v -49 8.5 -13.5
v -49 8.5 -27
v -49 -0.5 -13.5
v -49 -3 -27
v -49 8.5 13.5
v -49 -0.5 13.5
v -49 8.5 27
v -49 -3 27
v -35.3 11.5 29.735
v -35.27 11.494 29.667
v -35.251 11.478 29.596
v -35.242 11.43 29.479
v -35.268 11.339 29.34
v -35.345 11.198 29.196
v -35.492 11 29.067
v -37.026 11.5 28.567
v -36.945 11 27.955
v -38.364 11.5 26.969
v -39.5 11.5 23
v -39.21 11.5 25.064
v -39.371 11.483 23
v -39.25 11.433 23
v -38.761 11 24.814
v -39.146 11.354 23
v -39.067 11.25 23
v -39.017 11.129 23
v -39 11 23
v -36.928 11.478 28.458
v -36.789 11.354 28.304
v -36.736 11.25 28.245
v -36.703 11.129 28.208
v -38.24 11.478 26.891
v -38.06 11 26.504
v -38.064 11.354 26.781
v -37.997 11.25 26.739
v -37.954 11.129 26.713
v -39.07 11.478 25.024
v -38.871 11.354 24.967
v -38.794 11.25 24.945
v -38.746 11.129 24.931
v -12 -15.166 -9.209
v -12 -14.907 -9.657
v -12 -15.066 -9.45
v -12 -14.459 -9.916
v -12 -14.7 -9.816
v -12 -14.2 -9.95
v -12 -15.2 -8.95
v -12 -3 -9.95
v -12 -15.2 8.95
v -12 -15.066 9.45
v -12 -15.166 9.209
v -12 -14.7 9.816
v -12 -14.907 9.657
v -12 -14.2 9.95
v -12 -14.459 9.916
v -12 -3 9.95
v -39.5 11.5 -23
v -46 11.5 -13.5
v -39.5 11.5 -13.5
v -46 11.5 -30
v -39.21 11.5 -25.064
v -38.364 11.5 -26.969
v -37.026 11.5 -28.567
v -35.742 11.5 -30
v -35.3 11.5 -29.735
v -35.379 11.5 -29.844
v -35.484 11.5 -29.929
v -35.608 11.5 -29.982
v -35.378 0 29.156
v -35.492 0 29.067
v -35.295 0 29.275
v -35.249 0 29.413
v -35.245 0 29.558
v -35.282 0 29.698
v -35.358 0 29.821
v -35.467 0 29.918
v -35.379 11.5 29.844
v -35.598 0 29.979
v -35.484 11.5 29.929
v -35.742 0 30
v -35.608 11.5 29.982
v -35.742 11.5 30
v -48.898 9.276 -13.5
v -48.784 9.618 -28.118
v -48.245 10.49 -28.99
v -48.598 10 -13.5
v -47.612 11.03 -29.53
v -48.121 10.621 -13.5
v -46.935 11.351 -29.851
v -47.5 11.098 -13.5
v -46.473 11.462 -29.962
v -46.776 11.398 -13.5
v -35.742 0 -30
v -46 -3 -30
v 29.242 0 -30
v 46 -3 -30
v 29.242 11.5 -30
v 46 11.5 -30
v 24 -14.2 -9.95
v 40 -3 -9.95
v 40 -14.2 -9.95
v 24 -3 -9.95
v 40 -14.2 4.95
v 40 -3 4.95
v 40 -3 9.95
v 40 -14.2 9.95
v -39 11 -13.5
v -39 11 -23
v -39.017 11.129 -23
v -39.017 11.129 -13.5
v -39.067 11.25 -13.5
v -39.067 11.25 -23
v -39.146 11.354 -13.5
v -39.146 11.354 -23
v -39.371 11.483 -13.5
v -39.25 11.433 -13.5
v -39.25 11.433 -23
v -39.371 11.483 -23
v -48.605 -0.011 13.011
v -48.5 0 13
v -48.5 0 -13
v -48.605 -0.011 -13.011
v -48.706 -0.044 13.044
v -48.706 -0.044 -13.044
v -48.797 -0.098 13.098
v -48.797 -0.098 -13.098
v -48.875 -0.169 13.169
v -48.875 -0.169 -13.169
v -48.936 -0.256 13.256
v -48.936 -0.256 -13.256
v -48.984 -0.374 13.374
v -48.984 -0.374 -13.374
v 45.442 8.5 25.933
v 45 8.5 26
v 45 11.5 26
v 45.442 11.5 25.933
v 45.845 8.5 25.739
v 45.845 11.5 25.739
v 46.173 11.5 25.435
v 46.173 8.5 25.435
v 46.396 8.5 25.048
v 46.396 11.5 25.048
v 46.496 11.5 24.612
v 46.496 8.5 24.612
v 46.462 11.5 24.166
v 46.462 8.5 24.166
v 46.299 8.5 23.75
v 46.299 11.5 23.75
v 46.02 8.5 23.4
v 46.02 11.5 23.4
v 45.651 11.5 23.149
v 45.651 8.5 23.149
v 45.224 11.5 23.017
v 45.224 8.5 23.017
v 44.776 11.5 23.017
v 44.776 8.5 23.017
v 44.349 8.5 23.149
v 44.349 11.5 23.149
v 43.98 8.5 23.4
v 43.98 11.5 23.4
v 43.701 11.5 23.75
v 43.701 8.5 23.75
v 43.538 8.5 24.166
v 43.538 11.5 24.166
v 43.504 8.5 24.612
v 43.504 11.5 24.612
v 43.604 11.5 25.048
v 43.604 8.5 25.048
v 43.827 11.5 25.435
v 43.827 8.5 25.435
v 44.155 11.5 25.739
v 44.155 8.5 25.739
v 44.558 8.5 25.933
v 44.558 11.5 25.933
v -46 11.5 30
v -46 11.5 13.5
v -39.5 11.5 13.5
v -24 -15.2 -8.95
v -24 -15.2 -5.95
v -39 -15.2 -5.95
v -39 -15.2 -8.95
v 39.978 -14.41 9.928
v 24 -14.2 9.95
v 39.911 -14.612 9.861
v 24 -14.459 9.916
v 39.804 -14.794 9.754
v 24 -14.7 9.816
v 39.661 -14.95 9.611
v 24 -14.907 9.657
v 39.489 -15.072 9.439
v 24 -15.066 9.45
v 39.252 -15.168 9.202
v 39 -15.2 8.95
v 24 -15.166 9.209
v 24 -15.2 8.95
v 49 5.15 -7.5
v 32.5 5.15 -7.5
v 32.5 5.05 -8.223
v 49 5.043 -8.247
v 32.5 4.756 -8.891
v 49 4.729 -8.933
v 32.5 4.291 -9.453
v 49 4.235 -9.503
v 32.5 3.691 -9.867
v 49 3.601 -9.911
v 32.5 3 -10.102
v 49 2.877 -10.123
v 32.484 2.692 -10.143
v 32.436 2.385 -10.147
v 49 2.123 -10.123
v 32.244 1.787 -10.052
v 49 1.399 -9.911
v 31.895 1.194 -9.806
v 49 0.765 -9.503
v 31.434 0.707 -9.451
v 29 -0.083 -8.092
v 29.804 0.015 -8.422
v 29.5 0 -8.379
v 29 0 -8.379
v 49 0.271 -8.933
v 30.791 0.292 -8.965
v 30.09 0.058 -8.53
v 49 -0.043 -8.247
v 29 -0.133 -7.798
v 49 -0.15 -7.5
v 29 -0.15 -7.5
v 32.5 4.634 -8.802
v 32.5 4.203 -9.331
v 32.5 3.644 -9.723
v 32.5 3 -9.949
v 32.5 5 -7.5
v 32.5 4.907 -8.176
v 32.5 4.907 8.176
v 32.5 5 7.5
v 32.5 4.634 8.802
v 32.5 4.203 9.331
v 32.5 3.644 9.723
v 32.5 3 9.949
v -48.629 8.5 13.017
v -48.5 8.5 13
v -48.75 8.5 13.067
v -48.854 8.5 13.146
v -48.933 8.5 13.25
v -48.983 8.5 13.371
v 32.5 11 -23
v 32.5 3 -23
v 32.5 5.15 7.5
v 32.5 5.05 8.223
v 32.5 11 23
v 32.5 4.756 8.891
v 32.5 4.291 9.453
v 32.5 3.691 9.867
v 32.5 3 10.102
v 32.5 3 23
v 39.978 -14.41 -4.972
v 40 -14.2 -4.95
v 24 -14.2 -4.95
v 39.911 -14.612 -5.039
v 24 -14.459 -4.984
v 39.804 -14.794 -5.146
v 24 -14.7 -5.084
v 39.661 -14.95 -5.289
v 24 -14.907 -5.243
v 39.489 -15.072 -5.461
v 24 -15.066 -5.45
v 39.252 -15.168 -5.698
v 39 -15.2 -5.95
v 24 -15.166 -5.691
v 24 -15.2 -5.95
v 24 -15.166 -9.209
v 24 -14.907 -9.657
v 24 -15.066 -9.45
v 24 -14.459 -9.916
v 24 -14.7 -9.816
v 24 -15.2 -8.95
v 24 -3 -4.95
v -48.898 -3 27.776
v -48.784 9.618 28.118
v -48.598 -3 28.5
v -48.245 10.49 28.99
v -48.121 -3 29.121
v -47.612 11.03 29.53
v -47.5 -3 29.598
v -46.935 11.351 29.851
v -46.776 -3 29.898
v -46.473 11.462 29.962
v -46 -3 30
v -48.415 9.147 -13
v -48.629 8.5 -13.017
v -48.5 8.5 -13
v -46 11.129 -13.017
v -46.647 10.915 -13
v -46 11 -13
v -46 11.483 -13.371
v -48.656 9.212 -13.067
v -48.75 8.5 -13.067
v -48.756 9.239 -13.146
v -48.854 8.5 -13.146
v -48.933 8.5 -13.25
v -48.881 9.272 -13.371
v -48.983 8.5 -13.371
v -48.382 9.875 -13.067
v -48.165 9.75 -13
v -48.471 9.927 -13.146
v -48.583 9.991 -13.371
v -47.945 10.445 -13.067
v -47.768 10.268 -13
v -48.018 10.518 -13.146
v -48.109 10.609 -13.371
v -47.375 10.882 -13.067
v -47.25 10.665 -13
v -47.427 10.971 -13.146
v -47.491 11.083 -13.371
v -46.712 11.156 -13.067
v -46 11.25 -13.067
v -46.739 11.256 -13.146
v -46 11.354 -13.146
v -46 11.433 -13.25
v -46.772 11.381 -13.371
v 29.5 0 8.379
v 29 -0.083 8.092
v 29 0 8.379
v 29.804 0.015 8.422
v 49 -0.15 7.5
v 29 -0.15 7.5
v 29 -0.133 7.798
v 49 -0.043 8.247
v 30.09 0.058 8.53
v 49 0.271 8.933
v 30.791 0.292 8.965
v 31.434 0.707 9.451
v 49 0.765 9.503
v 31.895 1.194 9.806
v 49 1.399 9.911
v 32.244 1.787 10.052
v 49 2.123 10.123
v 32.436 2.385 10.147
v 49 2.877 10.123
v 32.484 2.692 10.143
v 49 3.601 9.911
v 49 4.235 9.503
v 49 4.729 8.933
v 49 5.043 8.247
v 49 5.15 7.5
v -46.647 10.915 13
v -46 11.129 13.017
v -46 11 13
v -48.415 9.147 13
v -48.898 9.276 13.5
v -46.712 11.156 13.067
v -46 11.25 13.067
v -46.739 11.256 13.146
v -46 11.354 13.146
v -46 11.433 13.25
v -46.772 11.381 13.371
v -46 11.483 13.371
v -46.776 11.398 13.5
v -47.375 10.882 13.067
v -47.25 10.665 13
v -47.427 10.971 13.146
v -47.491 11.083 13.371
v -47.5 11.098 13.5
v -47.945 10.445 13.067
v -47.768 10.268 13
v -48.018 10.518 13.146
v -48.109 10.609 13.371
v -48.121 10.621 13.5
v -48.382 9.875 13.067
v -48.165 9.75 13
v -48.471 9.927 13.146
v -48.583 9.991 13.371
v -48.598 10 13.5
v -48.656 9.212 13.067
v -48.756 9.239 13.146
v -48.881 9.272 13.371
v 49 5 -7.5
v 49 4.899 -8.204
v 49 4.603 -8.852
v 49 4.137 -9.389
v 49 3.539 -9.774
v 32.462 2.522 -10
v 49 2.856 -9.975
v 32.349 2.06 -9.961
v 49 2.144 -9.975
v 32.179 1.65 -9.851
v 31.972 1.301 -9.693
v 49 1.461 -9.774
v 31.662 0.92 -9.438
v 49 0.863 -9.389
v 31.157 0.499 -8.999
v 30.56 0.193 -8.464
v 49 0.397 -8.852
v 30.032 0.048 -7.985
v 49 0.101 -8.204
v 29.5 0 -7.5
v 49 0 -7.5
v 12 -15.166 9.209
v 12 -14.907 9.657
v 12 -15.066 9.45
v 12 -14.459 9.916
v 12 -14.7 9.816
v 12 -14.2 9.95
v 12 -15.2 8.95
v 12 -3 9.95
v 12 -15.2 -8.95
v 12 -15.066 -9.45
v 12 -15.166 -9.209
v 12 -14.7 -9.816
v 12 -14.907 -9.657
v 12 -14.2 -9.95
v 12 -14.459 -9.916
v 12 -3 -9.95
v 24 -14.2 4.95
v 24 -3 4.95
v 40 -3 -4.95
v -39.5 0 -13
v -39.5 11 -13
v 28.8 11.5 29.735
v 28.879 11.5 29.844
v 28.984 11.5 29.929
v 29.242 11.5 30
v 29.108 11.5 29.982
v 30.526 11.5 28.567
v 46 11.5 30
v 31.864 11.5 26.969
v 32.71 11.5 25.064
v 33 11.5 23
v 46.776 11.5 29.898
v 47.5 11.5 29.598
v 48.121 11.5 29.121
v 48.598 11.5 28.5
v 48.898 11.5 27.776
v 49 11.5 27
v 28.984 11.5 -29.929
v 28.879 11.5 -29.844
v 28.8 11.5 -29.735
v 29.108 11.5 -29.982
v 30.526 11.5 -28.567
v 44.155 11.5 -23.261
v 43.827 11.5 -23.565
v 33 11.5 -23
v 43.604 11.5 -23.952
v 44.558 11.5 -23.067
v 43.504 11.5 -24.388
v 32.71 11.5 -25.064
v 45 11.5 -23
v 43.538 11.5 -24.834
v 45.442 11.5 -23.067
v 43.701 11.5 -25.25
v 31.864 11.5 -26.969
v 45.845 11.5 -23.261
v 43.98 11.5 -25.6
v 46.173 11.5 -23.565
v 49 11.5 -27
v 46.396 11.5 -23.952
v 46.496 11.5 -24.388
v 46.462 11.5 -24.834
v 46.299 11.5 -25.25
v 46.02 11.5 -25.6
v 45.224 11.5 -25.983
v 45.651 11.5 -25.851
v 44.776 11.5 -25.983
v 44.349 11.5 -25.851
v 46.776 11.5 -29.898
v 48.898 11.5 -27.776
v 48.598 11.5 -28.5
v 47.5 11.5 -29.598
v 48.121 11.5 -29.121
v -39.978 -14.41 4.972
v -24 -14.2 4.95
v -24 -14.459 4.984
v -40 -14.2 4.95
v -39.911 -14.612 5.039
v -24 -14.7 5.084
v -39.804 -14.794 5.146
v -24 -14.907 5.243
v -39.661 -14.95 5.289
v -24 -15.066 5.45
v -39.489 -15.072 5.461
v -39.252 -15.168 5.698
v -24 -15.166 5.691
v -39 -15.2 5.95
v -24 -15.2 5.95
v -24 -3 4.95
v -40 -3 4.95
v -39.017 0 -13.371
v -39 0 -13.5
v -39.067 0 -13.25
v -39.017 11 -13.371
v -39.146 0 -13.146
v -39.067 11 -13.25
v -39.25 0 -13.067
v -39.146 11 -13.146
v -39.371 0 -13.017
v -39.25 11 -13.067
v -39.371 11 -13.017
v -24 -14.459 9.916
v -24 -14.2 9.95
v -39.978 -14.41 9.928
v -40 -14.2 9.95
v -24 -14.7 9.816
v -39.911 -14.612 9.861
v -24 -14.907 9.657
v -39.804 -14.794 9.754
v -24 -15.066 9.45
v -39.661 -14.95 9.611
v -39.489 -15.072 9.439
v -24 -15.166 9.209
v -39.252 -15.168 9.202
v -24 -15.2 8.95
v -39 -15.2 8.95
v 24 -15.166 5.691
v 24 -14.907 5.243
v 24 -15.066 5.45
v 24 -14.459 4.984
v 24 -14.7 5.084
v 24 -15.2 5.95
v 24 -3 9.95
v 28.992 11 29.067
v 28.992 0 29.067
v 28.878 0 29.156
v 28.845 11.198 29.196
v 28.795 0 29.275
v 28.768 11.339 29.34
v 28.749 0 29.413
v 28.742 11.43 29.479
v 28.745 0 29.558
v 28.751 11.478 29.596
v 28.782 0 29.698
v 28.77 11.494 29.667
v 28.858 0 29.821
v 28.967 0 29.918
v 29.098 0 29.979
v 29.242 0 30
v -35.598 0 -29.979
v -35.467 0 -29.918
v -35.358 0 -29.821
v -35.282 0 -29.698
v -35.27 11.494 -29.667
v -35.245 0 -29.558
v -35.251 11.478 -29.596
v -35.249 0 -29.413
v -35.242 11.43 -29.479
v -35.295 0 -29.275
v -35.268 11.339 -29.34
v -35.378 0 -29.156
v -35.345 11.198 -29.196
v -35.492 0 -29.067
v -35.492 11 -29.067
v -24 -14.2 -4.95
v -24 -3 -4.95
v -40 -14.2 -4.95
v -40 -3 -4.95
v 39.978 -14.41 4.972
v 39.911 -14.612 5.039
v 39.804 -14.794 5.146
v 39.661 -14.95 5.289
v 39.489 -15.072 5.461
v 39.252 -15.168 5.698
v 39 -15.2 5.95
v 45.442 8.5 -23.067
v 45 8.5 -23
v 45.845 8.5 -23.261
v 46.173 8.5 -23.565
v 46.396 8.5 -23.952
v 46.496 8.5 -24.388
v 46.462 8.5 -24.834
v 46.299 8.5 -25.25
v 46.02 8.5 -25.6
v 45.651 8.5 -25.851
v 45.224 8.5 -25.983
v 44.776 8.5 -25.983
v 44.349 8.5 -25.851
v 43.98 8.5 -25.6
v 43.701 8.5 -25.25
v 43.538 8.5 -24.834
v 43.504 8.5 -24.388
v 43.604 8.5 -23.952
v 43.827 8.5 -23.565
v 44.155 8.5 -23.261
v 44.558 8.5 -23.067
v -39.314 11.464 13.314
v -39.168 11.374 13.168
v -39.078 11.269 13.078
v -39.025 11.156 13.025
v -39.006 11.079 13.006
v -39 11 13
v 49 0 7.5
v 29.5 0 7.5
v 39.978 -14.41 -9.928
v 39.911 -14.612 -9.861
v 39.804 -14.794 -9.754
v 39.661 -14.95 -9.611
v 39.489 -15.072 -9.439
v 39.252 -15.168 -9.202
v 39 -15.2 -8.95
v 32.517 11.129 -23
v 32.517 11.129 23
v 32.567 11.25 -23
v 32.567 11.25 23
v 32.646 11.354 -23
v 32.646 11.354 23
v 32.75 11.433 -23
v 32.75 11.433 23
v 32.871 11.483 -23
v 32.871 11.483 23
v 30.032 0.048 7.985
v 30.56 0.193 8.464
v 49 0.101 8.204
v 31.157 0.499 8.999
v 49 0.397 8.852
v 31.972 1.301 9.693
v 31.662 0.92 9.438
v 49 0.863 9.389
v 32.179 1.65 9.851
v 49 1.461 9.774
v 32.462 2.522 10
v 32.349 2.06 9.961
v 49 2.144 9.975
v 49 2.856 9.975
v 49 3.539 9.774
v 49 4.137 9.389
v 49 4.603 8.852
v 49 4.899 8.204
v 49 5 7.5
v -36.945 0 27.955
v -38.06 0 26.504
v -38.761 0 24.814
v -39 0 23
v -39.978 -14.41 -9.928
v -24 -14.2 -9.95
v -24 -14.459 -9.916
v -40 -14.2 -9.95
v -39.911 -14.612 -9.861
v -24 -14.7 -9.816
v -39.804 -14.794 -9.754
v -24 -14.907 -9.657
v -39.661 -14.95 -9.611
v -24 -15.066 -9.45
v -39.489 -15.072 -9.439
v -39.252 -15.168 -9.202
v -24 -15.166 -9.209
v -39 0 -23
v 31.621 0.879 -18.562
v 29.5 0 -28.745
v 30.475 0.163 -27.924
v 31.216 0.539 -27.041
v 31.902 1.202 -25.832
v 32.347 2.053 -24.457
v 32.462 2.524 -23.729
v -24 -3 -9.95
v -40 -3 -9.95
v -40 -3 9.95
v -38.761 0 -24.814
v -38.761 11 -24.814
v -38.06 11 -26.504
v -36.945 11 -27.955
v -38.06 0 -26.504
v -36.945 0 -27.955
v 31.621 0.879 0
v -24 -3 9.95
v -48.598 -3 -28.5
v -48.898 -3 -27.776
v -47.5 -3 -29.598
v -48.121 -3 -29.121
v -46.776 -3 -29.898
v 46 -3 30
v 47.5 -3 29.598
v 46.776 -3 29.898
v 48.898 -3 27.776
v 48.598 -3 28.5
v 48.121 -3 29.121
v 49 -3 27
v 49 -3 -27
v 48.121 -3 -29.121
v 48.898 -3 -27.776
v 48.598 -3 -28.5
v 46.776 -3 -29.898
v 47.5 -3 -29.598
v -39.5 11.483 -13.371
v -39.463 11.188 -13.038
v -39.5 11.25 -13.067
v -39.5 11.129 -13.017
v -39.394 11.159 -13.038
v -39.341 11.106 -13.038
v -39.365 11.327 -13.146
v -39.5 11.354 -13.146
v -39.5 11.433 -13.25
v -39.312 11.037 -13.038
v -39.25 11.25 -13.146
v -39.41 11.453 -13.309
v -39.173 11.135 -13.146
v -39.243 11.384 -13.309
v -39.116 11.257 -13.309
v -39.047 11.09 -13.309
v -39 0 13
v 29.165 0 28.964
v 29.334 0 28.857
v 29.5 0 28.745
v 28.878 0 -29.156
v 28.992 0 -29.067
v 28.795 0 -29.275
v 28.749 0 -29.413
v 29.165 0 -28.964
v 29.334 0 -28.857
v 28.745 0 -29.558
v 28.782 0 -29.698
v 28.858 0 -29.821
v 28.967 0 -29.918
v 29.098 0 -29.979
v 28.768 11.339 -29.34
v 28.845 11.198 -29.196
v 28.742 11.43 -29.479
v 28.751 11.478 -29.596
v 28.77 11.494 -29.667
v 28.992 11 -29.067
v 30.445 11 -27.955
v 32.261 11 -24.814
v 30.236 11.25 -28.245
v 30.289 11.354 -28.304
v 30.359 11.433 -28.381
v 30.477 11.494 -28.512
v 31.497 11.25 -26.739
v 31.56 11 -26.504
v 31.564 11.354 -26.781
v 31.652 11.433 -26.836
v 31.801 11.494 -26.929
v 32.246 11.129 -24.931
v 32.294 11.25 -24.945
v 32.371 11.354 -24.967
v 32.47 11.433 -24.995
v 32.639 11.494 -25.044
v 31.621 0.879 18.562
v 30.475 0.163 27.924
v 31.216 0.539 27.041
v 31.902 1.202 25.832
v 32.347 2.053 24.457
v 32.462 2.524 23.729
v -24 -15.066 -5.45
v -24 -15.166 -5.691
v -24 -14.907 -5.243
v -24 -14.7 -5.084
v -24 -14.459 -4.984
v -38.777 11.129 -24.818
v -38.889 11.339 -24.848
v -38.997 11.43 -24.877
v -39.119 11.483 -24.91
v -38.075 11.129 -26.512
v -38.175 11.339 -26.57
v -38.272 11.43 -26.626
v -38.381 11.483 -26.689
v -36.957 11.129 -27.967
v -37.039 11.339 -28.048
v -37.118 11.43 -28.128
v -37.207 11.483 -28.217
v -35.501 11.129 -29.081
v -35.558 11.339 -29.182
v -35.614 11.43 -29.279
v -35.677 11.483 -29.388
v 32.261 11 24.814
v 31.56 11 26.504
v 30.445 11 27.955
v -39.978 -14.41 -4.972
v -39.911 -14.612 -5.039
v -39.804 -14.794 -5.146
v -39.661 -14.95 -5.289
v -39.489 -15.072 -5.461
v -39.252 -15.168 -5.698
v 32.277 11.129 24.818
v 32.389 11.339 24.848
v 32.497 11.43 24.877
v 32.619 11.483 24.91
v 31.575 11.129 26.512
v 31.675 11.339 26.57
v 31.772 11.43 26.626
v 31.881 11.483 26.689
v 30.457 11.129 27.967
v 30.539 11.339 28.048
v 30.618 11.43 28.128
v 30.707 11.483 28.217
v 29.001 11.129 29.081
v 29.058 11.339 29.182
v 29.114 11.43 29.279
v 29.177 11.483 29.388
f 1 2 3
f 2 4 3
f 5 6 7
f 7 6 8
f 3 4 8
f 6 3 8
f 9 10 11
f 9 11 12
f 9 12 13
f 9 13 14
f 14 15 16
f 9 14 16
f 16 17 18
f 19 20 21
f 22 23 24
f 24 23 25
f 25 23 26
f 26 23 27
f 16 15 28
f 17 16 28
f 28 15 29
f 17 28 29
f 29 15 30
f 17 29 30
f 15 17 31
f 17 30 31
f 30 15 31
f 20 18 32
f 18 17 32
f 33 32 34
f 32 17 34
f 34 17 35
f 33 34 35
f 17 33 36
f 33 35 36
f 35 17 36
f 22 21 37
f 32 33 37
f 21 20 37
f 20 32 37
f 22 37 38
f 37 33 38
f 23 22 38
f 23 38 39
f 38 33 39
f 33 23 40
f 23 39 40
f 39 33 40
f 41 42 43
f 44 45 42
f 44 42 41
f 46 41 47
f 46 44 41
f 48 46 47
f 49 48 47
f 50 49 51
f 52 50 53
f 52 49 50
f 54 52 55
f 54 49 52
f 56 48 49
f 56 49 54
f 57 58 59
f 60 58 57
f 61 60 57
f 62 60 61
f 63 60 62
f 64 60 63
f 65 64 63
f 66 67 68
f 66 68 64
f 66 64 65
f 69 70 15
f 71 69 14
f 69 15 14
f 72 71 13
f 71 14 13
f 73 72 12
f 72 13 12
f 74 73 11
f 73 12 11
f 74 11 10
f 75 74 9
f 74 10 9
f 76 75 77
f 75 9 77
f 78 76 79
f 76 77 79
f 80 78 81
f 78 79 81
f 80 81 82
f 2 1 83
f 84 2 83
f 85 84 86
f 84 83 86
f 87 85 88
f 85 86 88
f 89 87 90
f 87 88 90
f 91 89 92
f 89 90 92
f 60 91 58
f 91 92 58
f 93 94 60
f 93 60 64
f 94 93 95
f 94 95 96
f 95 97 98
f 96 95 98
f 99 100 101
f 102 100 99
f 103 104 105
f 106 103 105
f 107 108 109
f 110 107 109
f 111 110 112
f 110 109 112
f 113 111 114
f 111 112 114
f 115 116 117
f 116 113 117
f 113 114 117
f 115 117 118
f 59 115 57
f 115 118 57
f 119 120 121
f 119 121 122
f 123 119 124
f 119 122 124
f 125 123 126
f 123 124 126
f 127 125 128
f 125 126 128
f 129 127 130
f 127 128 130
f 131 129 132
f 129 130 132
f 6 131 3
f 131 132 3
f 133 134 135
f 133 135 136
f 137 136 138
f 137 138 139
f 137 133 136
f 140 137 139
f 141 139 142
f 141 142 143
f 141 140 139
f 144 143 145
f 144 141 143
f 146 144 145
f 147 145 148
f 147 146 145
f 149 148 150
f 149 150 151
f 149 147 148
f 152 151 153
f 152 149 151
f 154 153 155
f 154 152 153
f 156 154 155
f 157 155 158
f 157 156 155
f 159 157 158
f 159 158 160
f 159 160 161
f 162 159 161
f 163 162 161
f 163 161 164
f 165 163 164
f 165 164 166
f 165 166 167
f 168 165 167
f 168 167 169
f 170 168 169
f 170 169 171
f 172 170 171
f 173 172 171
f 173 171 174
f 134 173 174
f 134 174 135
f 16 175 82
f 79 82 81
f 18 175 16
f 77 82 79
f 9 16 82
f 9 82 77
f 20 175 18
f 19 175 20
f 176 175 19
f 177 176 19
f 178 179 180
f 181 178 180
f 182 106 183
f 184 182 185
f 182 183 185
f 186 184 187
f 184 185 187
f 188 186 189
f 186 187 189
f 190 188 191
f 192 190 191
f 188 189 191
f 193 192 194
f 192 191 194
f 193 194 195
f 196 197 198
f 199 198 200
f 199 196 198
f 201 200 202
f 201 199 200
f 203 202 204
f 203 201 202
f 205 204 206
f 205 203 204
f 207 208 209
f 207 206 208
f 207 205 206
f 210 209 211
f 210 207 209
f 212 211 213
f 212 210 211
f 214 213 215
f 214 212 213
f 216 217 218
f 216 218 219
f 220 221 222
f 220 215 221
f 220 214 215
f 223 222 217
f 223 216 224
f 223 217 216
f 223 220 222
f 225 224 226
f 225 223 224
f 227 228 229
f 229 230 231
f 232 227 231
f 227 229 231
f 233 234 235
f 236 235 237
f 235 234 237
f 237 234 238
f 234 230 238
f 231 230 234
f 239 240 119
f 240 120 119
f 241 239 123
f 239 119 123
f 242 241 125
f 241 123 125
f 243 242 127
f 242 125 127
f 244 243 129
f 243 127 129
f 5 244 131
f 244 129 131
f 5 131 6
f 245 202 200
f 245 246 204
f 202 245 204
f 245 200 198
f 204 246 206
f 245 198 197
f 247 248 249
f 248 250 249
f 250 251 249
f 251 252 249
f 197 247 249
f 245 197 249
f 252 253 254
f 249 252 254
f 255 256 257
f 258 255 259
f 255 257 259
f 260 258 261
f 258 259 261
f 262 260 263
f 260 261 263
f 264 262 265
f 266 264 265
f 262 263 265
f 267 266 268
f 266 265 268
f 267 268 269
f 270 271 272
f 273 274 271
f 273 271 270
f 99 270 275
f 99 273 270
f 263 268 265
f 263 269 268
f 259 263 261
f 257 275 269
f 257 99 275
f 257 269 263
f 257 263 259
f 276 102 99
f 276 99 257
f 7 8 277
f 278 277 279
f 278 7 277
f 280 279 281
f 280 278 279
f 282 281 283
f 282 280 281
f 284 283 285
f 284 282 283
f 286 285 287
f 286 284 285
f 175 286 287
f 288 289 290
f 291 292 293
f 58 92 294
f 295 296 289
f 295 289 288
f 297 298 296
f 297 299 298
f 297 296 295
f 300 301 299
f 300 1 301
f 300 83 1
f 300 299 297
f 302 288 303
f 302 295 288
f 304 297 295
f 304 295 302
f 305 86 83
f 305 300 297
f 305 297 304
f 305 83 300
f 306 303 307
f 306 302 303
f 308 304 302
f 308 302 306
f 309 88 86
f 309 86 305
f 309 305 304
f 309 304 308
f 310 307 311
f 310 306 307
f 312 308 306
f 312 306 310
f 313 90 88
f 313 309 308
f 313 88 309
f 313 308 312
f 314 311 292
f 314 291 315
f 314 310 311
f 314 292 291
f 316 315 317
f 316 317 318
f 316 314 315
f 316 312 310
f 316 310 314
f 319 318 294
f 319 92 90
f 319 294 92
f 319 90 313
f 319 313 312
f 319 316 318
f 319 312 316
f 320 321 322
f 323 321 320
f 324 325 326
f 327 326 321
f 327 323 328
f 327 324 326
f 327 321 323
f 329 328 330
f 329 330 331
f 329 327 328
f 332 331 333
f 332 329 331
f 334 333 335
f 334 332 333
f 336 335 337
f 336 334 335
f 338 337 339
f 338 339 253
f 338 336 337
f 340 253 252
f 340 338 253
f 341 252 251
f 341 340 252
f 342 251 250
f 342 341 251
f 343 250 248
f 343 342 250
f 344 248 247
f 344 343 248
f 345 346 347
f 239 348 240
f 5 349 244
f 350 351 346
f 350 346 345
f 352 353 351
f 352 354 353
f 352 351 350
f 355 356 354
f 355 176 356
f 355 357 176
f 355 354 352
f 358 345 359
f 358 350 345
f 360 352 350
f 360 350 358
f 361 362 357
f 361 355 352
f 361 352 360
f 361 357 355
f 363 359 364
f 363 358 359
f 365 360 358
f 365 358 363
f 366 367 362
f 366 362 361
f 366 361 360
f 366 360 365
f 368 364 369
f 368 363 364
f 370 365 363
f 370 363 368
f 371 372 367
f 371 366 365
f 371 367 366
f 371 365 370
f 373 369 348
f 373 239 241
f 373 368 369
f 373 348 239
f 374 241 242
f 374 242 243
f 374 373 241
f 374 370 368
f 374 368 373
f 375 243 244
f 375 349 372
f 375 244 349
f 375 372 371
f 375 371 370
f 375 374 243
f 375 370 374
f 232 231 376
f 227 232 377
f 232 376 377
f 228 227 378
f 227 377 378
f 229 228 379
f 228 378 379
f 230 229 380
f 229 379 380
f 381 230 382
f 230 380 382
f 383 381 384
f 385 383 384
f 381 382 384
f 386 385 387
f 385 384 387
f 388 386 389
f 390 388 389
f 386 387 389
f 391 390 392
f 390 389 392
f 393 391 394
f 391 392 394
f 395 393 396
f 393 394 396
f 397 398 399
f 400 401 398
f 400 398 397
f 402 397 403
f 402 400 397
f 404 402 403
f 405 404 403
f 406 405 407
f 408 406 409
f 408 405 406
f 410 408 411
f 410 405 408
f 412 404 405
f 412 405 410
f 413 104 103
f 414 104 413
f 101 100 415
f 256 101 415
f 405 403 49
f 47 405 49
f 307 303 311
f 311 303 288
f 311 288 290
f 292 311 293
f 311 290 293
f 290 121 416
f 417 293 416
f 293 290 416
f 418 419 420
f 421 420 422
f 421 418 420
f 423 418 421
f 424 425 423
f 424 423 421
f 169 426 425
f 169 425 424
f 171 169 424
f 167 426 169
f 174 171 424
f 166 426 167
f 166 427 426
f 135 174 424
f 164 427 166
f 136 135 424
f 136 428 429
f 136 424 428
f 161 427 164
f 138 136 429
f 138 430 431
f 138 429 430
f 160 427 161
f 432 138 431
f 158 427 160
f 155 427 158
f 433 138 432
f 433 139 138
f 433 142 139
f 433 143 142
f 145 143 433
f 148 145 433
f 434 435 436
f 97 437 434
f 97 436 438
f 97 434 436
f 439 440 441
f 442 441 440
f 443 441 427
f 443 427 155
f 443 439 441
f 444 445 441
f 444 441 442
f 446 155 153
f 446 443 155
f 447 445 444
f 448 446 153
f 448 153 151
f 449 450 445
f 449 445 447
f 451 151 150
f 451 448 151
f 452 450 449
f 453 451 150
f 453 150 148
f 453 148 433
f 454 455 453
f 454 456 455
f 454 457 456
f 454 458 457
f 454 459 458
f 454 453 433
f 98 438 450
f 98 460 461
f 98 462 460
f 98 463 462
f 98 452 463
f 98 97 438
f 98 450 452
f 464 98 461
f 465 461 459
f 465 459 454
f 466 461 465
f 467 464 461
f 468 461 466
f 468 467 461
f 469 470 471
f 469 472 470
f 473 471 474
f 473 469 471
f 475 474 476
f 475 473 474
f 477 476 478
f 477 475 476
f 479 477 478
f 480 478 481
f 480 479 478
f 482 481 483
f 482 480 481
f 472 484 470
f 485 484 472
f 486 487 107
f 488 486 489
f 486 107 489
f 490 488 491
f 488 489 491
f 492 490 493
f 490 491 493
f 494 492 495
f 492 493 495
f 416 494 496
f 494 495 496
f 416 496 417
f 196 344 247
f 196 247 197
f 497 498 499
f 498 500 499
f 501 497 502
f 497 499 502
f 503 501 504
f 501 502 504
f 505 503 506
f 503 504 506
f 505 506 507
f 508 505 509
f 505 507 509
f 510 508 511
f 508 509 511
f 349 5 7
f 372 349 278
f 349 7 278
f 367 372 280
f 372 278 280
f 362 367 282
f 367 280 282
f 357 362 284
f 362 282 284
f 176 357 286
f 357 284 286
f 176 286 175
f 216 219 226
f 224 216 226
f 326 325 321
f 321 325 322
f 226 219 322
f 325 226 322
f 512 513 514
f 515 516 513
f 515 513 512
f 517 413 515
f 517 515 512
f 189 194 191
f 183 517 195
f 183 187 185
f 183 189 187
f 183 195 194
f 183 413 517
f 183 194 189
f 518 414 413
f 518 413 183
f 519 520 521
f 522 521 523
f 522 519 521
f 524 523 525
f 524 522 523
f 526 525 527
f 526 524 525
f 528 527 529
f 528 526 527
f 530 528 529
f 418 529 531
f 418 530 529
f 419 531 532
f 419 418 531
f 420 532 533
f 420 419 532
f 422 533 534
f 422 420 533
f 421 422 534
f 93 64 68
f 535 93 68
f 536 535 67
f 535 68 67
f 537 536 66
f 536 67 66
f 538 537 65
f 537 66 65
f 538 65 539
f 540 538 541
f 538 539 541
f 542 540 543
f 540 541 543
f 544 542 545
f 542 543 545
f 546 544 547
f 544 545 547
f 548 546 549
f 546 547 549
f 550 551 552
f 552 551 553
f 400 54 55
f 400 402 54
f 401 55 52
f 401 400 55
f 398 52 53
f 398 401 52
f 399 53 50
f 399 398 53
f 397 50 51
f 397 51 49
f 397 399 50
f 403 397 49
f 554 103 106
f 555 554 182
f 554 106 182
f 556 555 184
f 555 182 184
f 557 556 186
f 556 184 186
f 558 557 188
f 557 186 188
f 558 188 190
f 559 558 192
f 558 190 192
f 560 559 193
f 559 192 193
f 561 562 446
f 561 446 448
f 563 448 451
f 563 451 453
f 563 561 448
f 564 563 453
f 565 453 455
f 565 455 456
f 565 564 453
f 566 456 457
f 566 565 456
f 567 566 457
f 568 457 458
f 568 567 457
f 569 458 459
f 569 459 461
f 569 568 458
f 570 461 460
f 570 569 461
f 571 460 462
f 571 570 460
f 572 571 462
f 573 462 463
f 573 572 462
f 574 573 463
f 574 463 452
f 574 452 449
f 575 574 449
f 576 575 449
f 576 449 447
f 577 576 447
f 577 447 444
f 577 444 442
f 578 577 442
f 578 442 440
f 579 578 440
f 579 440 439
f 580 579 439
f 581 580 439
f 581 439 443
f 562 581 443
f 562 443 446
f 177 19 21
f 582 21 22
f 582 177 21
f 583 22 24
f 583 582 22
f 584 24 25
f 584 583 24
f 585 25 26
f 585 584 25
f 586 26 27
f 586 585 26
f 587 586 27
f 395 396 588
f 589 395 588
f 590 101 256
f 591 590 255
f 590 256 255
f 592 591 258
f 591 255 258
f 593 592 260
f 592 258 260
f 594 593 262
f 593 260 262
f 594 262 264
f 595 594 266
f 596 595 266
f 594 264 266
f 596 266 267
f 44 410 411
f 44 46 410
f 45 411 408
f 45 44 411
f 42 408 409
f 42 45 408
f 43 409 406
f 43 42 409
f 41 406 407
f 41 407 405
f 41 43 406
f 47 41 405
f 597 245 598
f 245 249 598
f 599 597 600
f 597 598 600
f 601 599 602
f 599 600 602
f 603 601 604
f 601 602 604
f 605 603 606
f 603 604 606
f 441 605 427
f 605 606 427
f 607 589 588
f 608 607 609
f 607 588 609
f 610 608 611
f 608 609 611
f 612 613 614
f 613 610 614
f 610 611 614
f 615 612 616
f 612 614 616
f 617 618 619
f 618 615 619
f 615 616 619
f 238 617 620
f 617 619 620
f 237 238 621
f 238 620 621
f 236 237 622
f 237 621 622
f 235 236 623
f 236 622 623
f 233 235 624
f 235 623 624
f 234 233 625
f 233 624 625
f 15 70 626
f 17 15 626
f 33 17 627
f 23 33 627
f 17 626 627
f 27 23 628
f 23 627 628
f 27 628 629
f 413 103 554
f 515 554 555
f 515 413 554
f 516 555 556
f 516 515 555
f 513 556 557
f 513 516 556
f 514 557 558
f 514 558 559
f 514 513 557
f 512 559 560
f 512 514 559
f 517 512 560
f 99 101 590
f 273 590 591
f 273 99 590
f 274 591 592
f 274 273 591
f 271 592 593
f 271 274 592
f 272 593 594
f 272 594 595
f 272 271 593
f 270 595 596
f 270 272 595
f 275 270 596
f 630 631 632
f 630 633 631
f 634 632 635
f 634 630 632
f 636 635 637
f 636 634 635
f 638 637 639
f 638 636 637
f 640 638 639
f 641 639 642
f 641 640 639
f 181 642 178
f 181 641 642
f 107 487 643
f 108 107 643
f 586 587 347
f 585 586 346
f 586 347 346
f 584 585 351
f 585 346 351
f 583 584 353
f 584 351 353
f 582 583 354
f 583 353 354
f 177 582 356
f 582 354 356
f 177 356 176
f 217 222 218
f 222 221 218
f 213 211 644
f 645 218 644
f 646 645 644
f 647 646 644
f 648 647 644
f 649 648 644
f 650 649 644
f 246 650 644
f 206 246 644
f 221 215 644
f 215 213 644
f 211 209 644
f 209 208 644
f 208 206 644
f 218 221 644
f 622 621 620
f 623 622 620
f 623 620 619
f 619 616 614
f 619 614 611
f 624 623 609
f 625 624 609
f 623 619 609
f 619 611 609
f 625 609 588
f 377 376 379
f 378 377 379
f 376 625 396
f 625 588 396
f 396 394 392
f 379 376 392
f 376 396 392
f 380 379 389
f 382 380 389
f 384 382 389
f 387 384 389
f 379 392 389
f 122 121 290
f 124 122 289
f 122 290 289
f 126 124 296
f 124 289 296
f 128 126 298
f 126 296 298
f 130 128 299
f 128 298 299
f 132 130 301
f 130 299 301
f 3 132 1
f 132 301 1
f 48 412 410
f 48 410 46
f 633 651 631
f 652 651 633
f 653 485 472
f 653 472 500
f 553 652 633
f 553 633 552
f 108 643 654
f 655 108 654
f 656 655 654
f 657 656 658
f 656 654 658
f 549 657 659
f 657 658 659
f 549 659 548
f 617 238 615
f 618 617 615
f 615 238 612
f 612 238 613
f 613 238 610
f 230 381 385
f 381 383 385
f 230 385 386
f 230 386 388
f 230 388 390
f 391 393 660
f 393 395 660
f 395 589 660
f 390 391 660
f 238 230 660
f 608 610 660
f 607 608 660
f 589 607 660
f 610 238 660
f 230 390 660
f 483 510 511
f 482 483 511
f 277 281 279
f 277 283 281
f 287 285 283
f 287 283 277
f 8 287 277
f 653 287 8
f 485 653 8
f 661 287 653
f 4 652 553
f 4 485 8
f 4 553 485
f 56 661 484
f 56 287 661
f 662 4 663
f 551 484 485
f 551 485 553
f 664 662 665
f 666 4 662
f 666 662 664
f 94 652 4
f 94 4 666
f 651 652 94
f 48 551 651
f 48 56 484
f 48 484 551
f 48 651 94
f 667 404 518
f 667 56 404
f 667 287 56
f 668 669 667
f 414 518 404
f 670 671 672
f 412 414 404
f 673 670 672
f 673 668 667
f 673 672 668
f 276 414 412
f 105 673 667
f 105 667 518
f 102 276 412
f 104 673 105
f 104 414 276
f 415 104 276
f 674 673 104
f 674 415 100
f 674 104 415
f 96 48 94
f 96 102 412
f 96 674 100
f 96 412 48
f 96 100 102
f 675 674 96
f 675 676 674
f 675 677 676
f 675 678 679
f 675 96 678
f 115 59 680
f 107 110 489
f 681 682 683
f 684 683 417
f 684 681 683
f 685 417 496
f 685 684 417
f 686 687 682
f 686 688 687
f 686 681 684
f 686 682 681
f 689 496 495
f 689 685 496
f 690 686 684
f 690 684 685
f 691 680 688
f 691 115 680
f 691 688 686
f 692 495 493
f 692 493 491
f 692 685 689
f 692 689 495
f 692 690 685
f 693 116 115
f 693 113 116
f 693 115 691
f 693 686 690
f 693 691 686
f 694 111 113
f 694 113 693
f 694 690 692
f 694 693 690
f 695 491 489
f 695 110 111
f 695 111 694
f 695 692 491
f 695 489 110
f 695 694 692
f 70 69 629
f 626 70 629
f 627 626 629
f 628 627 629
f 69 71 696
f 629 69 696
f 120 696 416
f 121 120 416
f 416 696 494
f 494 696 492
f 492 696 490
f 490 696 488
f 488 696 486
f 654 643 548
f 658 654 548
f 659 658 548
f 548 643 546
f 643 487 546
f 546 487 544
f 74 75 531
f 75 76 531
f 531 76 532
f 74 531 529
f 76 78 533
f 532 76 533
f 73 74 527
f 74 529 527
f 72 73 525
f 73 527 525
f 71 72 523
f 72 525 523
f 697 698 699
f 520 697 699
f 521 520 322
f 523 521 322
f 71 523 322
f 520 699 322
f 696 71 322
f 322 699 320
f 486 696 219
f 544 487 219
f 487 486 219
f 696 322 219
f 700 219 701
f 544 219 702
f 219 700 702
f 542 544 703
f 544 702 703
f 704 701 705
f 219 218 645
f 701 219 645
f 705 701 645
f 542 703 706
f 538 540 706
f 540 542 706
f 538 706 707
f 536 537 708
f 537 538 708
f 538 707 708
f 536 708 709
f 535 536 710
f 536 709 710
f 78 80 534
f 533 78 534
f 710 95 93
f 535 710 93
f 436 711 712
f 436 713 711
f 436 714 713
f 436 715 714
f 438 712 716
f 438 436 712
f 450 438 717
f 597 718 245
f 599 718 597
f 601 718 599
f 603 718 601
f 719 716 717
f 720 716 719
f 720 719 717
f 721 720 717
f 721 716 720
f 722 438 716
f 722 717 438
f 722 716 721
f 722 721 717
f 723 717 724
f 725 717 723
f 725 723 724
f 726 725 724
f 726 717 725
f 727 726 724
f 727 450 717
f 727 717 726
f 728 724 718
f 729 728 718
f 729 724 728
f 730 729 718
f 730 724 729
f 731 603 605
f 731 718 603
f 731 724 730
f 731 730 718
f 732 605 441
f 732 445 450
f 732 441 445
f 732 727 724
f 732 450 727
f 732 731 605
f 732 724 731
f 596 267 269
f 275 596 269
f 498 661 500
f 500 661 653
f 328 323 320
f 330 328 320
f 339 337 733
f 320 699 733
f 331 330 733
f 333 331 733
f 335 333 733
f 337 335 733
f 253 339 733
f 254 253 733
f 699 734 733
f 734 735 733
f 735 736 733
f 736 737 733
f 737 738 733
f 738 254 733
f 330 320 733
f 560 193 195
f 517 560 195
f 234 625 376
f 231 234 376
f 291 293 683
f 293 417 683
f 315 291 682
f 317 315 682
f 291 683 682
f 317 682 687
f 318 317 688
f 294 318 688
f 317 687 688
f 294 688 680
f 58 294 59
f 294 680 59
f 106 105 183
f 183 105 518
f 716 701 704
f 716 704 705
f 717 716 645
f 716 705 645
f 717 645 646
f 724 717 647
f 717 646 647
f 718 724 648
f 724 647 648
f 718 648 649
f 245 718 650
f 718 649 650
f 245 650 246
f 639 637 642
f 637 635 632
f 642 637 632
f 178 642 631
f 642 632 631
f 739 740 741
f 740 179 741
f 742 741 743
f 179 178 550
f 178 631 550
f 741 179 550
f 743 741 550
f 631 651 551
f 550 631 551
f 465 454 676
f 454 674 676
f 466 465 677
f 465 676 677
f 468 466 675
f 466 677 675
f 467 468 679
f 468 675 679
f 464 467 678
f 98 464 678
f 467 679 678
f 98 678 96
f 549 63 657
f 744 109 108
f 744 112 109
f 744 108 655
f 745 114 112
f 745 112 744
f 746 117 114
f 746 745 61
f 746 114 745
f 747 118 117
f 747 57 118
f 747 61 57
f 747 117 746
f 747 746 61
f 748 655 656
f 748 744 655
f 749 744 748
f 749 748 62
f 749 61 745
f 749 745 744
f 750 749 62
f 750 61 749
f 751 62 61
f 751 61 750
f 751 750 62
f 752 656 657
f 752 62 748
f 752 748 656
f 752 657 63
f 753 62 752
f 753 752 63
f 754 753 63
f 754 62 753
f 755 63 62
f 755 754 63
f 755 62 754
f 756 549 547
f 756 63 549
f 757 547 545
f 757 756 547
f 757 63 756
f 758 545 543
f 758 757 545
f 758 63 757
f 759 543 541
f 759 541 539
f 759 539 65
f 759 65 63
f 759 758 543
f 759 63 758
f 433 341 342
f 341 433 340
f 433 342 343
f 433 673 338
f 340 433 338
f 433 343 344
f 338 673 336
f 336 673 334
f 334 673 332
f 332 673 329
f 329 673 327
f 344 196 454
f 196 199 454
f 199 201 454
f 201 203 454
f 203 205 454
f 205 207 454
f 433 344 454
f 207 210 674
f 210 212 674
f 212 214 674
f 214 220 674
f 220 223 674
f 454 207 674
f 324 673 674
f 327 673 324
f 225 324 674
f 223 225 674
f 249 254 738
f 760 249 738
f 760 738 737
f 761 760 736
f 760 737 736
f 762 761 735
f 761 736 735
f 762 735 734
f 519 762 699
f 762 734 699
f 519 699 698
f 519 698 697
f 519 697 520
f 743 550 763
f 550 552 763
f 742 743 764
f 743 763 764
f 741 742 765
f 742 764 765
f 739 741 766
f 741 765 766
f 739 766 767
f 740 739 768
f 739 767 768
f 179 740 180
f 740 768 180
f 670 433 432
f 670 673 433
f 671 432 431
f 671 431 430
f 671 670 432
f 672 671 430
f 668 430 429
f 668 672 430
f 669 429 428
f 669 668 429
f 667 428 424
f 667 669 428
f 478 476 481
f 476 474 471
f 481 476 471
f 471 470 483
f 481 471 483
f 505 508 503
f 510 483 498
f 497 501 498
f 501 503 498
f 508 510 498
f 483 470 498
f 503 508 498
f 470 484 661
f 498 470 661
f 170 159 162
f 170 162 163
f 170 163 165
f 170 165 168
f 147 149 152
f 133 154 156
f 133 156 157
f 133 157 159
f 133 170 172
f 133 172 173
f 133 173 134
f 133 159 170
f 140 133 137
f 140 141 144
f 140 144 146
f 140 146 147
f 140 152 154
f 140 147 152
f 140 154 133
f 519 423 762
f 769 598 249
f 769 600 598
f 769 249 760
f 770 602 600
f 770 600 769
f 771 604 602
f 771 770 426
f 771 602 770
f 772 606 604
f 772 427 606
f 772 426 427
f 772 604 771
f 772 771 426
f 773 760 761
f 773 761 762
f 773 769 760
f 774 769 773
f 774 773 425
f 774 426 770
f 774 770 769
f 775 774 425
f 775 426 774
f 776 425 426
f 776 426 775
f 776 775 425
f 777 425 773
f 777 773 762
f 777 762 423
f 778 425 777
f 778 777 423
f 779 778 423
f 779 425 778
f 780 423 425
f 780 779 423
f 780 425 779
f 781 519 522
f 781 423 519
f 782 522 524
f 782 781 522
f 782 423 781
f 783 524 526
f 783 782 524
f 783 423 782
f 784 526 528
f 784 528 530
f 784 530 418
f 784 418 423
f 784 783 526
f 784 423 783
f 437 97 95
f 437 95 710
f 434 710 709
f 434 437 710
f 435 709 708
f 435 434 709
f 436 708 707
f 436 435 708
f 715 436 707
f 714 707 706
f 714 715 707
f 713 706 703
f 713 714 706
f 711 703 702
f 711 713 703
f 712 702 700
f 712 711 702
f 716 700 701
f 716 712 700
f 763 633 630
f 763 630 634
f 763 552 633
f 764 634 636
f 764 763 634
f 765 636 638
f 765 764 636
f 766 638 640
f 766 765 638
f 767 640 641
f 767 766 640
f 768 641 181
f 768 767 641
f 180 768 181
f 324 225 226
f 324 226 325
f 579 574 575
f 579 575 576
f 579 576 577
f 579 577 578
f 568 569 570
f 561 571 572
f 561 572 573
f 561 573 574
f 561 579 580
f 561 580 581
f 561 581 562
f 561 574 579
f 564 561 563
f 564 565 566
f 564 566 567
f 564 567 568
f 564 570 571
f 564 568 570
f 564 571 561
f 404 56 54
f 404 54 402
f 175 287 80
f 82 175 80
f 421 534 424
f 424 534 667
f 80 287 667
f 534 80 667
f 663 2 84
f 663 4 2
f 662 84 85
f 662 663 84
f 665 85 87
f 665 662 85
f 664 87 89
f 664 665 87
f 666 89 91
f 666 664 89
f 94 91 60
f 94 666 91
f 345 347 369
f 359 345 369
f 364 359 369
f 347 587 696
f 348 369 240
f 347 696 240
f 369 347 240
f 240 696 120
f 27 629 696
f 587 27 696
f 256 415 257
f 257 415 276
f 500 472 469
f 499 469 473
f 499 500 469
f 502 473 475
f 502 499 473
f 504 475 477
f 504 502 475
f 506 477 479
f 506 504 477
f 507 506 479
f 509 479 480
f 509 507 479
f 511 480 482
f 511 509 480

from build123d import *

# Parameters (mm, degrees)
SKETCH1_W           = 13.75
SKETCH1_H           = 49
SKETCH1_W_2         = 16.25
BOSS_EXTRUDE1_DEPTH = 3
SKETCH8_W           = 16
SKETCH8_H           = 5
SKETCH8_W_2         = 12
SKETCH8_H_2         = 9.95
BOSS_EXTRUDE4_DEPTH = 12.2
SKETCH10_R          = 1.5
BOSS_EXTRUDE5_DEPTH = 11.5
SKETCH10_3_R        = 1.5
BOSS_EXTRUDE6_DEPTH = 8.5
BOSS_EXTRUDE8_DEPTH = 11.5
FILLET1_R           = 3
FILLET4_START       = -30
FILLET4_DEPTH       = 60
FILLET6_R           = 1
CUT_EXTRUDE1_DEPTH  = 20
FILLET7_R           = 0.5


with BuildPart() as part:
    # Sketch1 → Boss-Extrude1 (new body)
    with BuildSketch(Plane(origin=(2.725879216, 0, 0), x_dir=(0, 0, -1), z_dir=(0, -1, 0))):
        with Locations((-23.125, 21.774120784)):
            Rectangle(SKETCH1_W, SKETCH1_H)
        with Locations((-23.125, -27.225879216)):
            Rectangle(SKETCH1_W, SKETCH1_H)
        with Locations((-9.375, 21.774120784)):
            Rectangle(SKETCH1_W, SKETCH1_H)
        with Locations((-9.375, -27.225879216)):
            Rectangle(SKETCH1_W, SKETCH1_H)
        with Locations((5.625, 21.774120784)):
            Rectangle(SKETCH1_W_2, SKETCH1_H)
        with Locations((5.625, -27.225879216)):
            Rectangle(SKETCH1_W_2, SKETCH1_H)
        with Locations((21.875, 21.774120784)):
            Rectangle(SKETCH1_W_2, SKETCH1_H)
        with Locations((21.875, -27.225879216)):
            Rectangle(SKETCH1_W_2, SKETCH1_H)
    extrude(amount=BOSS_EXTRUDE1_DEPTH)

    # Sketch8 → Boss-Extrude4 (add)
    with BuildSketch(Plane(origin=(0, -3, -2), x_dir=(-1, 0, 0), z_dir=(0, 1, 0))):
        with Locations((-32, 9.45)):
            Rectangle(SKETCH8_W, SKETCH8_H)
        with Locations((-32, -5.45)):
            Rectangle(SKETCH8_W, SKETCH8_H)
        with Locations((6, -2.975)):
            Rectangle(SKETCH8_W_2, SKETCH8_H_2)
        with Locations((-6, -2.975)):
            Rectangle(SKETCH8_W_2, SKETCH8_H_2)
        with Locations((-6, 6.975)):
            Rectangle(SKETCH8_W_2, SKETCH8_H_2)
        with Locations((6, 6.975)):
            Rectangle(SKETCH8_W_2, SKETCH8_H_2)
        with Locations((32, -5.45)):
            Rectangle(SKETCH8_W, SKETCH8_H)
        with Locations((32, 9.45)):
            Rectangle(SKETCH8_W, SKETCH8_H)
    extrude(amount=-BOSS_EXTRUDE4_DEPTH)

    # Sketch10 → Boss-Extrude5 (add)
    with BuildSketch(Plane(origin=(0, 0, 0), x_dir=(1, 0, 0), z_dir=(0, 1, 0))):
        with BuildLine():
            Line((49, 30), (25.5, 30))
            ThreePointArc((25.5, 30), (30.449747468, 27.949747468), (32.5, 23))
            Line((32.5, 23), (32.5, -23))
            ThreePointArc((32.5, -23), (30.449747483, -27.949747453), (25.500000042, -30))
            Line((25.500000042, -30), (49, -30))
            Line((49, -30), (49, 30))
        make_face()
        with Locations(Location((45, 24.5, 0), (0, 0, 270))):
            Circle(SKETCH10_R, mode=Mode.SUBTRACT)
        with Locations(Location((45, -24.5, 0), (0, 0, 270))):
            Circle(SKETCH10_R, mode=Mode.SUBTRACT)
    extrude(amount=BOSS_EXTRUDE5_DEPTH)

    # Sketch10<3> → Boss-Extrude6 (add)
    with BuildSketch(Plane(origin=(0, 0, 0), x_dir=(1, 0, 0), z_dir=(0, 1, 0))):
        with Locations(Location((45, 24.5, 0), (0, 0, 270))):
            Circle(SKETCH10_3_R)
        with Locations(Location((45, -24.5, 0), (0, 0, 270))):
            Circle(SKETCH10_3_R)
    extrude(amount=BOSS_EXTRUDE6_DEPTH)

    # Sketch14 → Boss-Extrude8 (add)
    with BuildSketch(Plane(origin=(0, 0, 0), x_dir=(1, 0, 0), z_dir=(0, 1, 0))):
        with BuildLine():
            Line((-49, 30), (-49, 13))
            Line((-49, 13), (-39, 13))
            Line((-39, 13), (-39, 23))
            ThreePointArc((-39, 23), (-36.949747468, 27.949747468), (-32, 30))
            Line((-32, 30), (-49, 30))
        make_face()
        with BuildLine():
            Line((-39, -13), (-49, -13))
            Line((-49, -13), (-49, -30))
            Line((-49, -30), (-32, -30))
            ThreePointArc((-32, -30), (-36.949747468, -27.949747468), (-39, -23))
            Line((-39, -23), (-39, -13))
        make_face()
    extrude(amount=BOSS_EXTRUDE8_DEPTH)

    # Fillet1
    fillet1_edges = [part.edges().sort_by_distance(p)[0] for p in [
        (49, 4.25, -30),
        (49, 4.25, 30),
        (-49, 4.25, 30),
        (-49, 4.25, -30),
        (-49, 11.5, -21.5),
        (-49, 11.5, 21.5),
    ]]
    fillet(fillet1_edges, radius=FILLET1_R)

    # Fillet4: read off the stored shape, not the designer's step
    # Fillet4 outline → Fillet4 (add)
    with BuildSketch(Plane.XY.offset(FILLET4_START)):
        with BuildLine():
            Line((32.5, 0), (32.5, 3))
            add(Edge.make_bspline(
                [(32.5, 3), (32.5, 0), (29.5, 0)],
                knots=[0, 0, 0, 1, 1, 1], degree=2, weights=[1, 0.707106781, 1]))
            Line((29.5, 0), (32.5, 0))
        make_face()
    extrude(amount=FILLET4_DEPTH)

    # Fillet6
    fillet6_edges = [part.edges().sort_by_distance(p)[0] for p in [
        (32, -15.2, 9.95),
        (32, -15.2, 4.95),
        (40, -15.2, 7.45),
        (32, -15.2, -4.95),
        (32, -15.2, -9.95),
        (40, -15.2, -7.45),
        (0, -15.2, 9.95),
        (0, -15.2, -9.95),
        (-32, -15.2, -9.95),
        (-32, -15.2, -4.95),
        (-40, -15.2, -7.45),
        (-32, -15.2, 4.95),
        (-32, -15.2, 9.95),
        (-40, -15.2, 7.45),
    ]]
    fillet(fillet6_edges, radius=FILLET6_R)

    # Sketch16 → Cut-Extrude1 (cut)
    with BuildSketch(Plane(origin=(49, 0, 0), x_dir=(0, 0, -1), z_dir=(1, 0, 0))):
        with BuildLine():
            Line((-7.5, 5.15), (7.5, 5.15))
            ThreePointArc((7.5, 5.15), (10.15, 2.5), (7.5, -0.15))
            Line((7.5, -0.15), (-7.5, -0.15))
            ThreePointArc((-7.5, -0.15), (-10.15, 2.5), (-7.5, 5.15))
        make_face()
        with BuildLine():
            Line((-7.5, 5), (7.5, 5))
            ThreePointArc((7.5, 5), (10, 2.5), (7.5, 0))
            Line((7.5, 0), (-7.5, 0))
            ThreePointArc((-7.5, 0), (-10, 2.5), (-7.5, 5))
        make_face(mode=Mode.SUBTRACT)
    extrude(amount=-CUT_EXTRUDE1_DEPTH, mode=Mode.SUBTRACT)


with BuildPart() as cut_extrude1_piece_1:
    # of the separate pieces the step leaves, piece 1, a body of its own (cut_extrude1_pieces)
    add(part.part.solids().sort_by_distance((-24, -14.2, 9.95))[0])

    # Fillet7
    fillet7_edges = [cut_extrude1_piece_1.edges().sort_by_distance(p)[0] for p in [
        (-36.949747468, 11.5, 27.949747468),
        (-32, 5.75, 30),
        (-42.5, 11.5, 13),
        (-48.121320344, 10.621320344, 13),
        (-36.949747468, 11.5, -27.949747468),
        (-39, 11.5, 18),
        (30.449747468, 11.5, -27.949747468),
        (30.449747483, 11.5, 27.949747453),
        (-42.5, 11.5, -13),
        (-48.121320344, 10.621320344, -13),
        (-49, 4.25, 13),
        (-49, 0, 0),
        (-39, 11.5, -18),
        (32.5, 11.5, 0),
        (25.500000042, 5.75, 30),
        (25.5, 5.75, -30),
        (-32, 5.75, -30),
        (-39, 5.75, -13),
        (-49, 4.25, -13),
    ]]
    fillet(fillet7_edges, radius=FILLET7_R)


with BuildPart() as cut_extrude1_piece_2:
    # of the separate pieces the step leaves, piece 2, a body of its own (cut_extrude1_pieces)
    add(part.part.solids().sort_by_distance((49, 0, -7.5))[0])


solid = Compound([cut_extrude1_piece_1.part, cut_extrude1_piece_2.part])
